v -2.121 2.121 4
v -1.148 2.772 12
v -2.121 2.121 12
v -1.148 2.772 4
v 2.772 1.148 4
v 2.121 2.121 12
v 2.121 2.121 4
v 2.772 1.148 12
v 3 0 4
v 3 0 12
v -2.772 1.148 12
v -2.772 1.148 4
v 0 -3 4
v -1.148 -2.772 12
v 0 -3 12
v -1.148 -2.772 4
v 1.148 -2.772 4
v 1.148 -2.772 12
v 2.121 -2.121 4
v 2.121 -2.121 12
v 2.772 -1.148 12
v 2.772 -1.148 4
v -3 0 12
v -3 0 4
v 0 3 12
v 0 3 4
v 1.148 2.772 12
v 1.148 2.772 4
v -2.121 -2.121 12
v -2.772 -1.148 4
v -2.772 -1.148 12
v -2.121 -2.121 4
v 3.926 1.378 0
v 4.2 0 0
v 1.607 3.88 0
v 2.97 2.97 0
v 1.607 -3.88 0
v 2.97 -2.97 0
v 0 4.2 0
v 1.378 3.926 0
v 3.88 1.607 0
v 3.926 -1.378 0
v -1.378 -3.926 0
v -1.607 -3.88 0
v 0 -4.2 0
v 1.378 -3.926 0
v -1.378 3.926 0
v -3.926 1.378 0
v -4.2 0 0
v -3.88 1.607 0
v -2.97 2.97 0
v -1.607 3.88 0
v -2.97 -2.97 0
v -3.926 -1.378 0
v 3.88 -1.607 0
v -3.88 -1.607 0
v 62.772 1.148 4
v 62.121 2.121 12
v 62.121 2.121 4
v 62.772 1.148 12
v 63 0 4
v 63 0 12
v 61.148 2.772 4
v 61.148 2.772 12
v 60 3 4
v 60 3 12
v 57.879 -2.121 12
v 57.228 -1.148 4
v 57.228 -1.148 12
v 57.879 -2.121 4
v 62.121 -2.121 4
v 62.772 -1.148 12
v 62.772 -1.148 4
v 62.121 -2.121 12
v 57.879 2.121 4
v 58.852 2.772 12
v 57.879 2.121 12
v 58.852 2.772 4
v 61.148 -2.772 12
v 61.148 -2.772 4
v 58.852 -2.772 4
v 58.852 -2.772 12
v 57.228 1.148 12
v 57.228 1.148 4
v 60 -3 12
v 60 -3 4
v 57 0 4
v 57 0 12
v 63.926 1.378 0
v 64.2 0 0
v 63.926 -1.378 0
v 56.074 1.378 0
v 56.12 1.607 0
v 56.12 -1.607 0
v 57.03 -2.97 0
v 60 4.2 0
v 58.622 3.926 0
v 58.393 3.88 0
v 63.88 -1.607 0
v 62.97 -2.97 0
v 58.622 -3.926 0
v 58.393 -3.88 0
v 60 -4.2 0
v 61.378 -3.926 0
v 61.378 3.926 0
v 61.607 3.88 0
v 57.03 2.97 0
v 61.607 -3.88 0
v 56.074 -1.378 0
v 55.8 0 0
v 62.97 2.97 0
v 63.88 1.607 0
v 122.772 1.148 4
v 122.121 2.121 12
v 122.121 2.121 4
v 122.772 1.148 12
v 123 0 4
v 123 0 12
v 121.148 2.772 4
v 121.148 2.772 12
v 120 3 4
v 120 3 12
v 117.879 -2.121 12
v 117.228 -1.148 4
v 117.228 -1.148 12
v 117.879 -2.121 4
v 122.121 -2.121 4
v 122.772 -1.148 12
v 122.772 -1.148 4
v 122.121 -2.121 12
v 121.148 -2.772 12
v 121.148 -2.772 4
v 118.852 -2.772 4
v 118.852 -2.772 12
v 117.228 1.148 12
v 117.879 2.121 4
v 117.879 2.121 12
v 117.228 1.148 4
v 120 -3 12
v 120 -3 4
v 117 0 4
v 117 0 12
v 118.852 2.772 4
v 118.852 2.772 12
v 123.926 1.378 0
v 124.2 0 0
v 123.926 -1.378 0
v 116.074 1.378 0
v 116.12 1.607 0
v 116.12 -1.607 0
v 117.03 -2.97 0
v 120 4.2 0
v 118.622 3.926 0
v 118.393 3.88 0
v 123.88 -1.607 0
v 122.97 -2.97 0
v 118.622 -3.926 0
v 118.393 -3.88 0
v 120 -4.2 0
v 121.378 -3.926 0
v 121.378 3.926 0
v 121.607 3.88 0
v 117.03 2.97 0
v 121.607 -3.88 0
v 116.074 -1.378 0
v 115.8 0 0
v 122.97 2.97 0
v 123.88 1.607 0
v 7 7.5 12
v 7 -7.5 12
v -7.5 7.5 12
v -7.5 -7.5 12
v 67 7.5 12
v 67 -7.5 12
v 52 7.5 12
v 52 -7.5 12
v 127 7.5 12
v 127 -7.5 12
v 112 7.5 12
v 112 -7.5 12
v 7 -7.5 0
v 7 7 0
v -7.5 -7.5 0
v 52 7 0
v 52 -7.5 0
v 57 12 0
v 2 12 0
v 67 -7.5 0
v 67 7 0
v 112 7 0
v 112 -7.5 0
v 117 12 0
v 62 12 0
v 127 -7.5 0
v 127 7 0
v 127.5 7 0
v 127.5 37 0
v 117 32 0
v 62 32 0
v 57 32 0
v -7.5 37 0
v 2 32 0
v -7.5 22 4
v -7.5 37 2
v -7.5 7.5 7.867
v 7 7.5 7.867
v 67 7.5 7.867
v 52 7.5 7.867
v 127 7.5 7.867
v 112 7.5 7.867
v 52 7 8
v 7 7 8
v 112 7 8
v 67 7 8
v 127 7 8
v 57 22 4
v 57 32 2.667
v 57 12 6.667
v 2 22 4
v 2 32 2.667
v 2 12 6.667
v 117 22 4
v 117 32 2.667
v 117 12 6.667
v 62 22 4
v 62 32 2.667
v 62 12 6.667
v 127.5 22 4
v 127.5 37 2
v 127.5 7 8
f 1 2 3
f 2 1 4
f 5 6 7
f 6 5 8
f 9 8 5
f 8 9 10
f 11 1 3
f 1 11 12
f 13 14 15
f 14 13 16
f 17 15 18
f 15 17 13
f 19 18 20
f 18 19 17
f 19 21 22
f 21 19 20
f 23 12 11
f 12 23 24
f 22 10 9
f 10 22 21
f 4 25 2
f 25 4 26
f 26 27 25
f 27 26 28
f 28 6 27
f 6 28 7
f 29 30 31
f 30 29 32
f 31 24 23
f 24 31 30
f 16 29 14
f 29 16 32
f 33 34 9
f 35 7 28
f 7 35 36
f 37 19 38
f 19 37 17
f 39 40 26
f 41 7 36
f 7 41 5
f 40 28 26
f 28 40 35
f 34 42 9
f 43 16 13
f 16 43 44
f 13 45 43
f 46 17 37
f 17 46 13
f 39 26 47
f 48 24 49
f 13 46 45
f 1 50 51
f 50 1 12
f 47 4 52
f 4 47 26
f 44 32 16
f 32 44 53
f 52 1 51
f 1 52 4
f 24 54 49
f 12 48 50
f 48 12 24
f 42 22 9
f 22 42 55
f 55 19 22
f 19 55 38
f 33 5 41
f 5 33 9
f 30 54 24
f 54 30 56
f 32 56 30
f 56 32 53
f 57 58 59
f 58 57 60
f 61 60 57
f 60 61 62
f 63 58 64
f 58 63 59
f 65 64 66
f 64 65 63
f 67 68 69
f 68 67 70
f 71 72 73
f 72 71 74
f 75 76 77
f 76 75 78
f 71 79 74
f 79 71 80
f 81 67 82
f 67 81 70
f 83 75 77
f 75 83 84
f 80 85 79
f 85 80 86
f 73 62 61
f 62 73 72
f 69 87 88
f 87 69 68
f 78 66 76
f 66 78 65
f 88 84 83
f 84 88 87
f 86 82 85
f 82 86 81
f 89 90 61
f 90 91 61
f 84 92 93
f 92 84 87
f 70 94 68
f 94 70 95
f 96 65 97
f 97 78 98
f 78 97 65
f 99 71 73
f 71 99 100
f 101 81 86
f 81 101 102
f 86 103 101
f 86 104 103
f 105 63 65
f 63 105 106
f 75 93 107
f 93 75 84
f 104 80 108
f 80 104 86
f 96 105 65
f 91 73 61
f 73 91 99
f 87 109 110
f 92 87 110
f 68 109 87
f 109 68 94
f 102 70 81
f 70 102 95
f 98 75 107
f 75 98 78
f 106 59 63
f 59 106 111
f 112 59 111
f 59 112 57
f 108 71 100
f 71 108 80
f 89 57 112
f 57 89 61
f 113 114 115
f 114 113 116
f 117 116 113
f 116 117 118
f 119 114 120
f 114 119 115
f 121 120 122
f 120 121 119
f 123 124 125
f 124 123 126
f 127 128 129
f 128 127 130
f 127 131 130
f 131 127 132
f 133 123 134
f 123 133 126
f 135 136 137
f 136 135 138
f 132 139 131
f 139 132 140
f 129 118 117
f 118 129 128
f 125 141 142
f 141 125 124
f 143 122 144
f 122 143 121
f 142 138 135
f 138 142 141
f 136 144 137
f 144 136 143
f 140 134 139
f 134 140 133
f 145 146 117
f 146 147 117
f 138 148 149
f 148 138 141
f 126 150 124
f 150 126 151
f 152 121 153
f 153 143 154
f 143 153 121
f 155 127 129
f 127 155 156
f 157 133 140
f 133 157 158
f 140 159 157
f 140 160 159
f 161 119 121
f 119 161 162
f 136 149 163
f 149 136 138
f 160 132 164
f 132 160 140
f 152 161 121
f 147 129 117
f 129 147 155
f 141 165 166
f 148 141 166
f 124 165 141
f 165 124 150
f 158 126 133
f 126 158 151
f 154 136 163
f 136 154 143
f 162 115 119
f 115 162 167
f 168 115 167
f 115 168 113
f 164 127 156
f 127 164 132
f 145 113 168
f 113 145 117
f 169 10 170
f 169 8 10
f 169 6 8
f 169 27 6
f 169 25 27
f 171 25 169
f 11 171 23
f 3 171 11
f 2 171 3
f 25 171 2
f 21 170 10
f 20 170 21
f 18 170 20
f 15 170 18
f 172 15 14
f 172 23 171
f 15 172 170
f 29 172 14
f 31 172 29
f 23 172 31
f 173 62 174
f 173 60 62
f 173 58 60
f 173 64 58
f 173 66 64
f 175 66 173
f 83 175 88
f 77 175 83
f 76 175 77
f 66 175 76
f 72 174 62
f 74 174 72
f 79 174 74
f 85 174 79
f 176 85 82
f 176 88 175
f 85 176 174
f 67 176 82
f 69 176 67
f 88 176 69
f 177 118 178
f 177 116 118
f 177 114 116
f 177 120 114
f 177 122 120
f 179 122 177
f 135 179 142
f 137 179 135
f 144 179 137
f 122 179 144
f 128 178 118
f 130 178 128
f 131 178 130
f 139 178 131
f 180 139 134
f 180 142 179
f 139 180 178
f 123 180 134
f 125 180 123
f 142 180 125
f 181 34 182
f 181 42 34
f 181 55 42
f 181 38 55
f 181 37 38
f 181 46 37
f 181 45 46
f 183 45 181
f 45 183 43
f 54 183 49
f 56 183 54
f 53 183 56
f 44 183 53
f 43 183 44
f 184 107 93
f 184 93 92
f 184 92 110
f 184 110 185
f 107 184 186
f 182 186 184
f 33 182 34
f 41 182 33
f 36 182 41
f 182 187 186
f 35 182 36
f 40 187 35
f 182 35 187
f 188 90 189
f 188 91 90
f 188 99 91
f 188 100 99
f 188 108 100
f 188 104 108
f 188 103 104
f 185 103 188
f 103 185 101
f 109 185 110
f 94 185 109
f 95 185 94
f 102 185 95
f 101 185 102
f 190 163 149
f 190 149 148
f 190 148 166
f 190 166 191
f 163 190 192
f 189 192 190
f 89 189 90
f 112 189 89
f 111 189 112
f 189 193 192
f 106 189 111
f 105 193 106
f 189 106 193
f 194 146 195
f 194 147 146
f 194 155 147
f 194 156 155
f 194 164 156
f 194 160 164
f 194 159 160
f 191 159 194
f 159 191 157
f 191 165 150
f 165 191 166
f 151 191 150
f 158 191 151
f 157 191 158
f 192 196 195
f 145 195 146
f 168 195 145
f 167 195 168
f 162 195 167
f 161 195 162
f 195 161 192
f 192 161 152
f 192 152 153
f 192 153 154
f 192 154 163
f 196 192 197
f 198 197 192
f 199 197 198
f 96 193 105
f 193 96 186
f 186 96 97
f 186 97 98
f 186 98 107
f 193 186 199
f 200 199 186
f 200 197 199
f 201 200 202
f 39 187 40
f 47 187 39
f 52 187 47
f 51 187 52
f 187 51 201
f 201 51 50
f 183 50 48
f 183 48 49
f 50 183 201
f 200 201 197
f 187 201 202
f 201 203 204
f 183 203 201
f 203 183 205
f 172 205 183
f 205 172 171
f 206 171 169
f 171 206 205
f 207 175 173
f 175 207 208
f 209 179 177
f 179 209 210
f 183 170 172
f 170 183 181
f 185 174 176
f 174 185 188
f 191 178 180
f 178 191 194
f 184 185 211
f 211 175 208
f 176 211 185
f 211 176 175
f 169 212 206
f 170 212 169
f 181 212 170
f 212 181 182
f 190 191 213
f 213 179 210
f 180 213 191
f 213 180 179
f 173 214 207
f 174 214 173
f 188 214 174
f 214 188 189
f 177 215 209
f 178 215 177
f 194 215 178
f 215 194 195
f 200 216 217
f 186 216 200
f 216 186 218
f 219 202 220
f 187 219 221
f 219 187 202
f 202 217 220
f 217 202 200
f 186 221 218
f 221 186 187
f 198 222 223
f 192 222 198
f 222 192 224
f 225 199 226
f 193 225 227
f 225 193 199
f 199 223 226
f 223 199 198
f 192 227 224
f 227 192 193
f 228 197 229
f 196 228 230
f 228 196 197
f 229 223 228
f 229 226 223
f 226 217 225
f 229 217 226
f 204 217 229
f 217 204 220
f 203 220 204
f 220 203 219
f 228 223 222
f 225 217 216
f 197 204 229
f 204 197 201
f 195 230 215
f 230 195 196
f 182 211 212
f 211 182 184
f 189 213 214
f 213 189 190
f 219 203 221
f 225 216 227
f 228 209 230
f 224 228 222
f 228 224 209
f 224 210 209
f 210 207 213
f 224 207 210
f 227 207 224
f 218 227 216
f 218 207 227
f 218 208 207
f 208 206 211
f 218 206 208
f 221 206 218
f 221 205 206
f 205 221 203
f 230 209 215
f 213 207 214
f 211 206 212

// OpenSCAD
assemble(segments=3,s_length=60,height=12,shifter_height=8,shifter_length=30,hole_diameter=3);

module assemble(segments,s_length,height,shifter_height,shifter_length,hole_diameter)
{  union()
    { fixpoints(segments,s_length,height,hole_diameter);
      difference()
      {translate([0,7.0,0])shifter_2(s_length*(segments-1)+15,shifter_length,shifter_height,2);
    union()
    { for (x = [0 :  (segments-2)])
        { translate([(s_length)*x+2,12,-1]) cube([s_length-5,shifter_length-10,20]);
		 }
	 }
  }  
  }
     
   
}

module shifter_2(length,width,height,shift)
{ translate([length-7.5,0,0]) rotate([0,-90,0]) linear_extrude(height = length,$fn=2) polygon( points=[[0,0],[0,width],[0+shift,width],[height/2,width/2],[height,0],[height,0]] );


}

module fixpoints(segments,s_length,height,hole_diameter)
{ difference()
  { difference()
    { translate([-7.5,-7.5,0]) cube([s_length*(segments)-15,15,height]);
	  
      union()
      { for (x = [0 :  segments])
        { sinkhole(x*s_length,0,hole_diameter,30,5);
          echo ("Segment ",x);
		 }
      }
    }
	union()
      { for (x = [0 :  segments])
        { translate([(s_length)*x+7,-8.5,-1]) cube([s_length-15,17,height+2]);
		 }
      }
    
  }
}


module sinkhole(x,y,diameter,height,sinkheight)
{ translate([x,y,-1])
  cylinder(h = height,r1=diameter, r2=diameter,center=false,$fn=16);
  translate([x,y,-1])
  cylinder(h = sinkheight,r1=diameter+diameter*0.5, r2=diameter,center=false,$fn=16);

}
